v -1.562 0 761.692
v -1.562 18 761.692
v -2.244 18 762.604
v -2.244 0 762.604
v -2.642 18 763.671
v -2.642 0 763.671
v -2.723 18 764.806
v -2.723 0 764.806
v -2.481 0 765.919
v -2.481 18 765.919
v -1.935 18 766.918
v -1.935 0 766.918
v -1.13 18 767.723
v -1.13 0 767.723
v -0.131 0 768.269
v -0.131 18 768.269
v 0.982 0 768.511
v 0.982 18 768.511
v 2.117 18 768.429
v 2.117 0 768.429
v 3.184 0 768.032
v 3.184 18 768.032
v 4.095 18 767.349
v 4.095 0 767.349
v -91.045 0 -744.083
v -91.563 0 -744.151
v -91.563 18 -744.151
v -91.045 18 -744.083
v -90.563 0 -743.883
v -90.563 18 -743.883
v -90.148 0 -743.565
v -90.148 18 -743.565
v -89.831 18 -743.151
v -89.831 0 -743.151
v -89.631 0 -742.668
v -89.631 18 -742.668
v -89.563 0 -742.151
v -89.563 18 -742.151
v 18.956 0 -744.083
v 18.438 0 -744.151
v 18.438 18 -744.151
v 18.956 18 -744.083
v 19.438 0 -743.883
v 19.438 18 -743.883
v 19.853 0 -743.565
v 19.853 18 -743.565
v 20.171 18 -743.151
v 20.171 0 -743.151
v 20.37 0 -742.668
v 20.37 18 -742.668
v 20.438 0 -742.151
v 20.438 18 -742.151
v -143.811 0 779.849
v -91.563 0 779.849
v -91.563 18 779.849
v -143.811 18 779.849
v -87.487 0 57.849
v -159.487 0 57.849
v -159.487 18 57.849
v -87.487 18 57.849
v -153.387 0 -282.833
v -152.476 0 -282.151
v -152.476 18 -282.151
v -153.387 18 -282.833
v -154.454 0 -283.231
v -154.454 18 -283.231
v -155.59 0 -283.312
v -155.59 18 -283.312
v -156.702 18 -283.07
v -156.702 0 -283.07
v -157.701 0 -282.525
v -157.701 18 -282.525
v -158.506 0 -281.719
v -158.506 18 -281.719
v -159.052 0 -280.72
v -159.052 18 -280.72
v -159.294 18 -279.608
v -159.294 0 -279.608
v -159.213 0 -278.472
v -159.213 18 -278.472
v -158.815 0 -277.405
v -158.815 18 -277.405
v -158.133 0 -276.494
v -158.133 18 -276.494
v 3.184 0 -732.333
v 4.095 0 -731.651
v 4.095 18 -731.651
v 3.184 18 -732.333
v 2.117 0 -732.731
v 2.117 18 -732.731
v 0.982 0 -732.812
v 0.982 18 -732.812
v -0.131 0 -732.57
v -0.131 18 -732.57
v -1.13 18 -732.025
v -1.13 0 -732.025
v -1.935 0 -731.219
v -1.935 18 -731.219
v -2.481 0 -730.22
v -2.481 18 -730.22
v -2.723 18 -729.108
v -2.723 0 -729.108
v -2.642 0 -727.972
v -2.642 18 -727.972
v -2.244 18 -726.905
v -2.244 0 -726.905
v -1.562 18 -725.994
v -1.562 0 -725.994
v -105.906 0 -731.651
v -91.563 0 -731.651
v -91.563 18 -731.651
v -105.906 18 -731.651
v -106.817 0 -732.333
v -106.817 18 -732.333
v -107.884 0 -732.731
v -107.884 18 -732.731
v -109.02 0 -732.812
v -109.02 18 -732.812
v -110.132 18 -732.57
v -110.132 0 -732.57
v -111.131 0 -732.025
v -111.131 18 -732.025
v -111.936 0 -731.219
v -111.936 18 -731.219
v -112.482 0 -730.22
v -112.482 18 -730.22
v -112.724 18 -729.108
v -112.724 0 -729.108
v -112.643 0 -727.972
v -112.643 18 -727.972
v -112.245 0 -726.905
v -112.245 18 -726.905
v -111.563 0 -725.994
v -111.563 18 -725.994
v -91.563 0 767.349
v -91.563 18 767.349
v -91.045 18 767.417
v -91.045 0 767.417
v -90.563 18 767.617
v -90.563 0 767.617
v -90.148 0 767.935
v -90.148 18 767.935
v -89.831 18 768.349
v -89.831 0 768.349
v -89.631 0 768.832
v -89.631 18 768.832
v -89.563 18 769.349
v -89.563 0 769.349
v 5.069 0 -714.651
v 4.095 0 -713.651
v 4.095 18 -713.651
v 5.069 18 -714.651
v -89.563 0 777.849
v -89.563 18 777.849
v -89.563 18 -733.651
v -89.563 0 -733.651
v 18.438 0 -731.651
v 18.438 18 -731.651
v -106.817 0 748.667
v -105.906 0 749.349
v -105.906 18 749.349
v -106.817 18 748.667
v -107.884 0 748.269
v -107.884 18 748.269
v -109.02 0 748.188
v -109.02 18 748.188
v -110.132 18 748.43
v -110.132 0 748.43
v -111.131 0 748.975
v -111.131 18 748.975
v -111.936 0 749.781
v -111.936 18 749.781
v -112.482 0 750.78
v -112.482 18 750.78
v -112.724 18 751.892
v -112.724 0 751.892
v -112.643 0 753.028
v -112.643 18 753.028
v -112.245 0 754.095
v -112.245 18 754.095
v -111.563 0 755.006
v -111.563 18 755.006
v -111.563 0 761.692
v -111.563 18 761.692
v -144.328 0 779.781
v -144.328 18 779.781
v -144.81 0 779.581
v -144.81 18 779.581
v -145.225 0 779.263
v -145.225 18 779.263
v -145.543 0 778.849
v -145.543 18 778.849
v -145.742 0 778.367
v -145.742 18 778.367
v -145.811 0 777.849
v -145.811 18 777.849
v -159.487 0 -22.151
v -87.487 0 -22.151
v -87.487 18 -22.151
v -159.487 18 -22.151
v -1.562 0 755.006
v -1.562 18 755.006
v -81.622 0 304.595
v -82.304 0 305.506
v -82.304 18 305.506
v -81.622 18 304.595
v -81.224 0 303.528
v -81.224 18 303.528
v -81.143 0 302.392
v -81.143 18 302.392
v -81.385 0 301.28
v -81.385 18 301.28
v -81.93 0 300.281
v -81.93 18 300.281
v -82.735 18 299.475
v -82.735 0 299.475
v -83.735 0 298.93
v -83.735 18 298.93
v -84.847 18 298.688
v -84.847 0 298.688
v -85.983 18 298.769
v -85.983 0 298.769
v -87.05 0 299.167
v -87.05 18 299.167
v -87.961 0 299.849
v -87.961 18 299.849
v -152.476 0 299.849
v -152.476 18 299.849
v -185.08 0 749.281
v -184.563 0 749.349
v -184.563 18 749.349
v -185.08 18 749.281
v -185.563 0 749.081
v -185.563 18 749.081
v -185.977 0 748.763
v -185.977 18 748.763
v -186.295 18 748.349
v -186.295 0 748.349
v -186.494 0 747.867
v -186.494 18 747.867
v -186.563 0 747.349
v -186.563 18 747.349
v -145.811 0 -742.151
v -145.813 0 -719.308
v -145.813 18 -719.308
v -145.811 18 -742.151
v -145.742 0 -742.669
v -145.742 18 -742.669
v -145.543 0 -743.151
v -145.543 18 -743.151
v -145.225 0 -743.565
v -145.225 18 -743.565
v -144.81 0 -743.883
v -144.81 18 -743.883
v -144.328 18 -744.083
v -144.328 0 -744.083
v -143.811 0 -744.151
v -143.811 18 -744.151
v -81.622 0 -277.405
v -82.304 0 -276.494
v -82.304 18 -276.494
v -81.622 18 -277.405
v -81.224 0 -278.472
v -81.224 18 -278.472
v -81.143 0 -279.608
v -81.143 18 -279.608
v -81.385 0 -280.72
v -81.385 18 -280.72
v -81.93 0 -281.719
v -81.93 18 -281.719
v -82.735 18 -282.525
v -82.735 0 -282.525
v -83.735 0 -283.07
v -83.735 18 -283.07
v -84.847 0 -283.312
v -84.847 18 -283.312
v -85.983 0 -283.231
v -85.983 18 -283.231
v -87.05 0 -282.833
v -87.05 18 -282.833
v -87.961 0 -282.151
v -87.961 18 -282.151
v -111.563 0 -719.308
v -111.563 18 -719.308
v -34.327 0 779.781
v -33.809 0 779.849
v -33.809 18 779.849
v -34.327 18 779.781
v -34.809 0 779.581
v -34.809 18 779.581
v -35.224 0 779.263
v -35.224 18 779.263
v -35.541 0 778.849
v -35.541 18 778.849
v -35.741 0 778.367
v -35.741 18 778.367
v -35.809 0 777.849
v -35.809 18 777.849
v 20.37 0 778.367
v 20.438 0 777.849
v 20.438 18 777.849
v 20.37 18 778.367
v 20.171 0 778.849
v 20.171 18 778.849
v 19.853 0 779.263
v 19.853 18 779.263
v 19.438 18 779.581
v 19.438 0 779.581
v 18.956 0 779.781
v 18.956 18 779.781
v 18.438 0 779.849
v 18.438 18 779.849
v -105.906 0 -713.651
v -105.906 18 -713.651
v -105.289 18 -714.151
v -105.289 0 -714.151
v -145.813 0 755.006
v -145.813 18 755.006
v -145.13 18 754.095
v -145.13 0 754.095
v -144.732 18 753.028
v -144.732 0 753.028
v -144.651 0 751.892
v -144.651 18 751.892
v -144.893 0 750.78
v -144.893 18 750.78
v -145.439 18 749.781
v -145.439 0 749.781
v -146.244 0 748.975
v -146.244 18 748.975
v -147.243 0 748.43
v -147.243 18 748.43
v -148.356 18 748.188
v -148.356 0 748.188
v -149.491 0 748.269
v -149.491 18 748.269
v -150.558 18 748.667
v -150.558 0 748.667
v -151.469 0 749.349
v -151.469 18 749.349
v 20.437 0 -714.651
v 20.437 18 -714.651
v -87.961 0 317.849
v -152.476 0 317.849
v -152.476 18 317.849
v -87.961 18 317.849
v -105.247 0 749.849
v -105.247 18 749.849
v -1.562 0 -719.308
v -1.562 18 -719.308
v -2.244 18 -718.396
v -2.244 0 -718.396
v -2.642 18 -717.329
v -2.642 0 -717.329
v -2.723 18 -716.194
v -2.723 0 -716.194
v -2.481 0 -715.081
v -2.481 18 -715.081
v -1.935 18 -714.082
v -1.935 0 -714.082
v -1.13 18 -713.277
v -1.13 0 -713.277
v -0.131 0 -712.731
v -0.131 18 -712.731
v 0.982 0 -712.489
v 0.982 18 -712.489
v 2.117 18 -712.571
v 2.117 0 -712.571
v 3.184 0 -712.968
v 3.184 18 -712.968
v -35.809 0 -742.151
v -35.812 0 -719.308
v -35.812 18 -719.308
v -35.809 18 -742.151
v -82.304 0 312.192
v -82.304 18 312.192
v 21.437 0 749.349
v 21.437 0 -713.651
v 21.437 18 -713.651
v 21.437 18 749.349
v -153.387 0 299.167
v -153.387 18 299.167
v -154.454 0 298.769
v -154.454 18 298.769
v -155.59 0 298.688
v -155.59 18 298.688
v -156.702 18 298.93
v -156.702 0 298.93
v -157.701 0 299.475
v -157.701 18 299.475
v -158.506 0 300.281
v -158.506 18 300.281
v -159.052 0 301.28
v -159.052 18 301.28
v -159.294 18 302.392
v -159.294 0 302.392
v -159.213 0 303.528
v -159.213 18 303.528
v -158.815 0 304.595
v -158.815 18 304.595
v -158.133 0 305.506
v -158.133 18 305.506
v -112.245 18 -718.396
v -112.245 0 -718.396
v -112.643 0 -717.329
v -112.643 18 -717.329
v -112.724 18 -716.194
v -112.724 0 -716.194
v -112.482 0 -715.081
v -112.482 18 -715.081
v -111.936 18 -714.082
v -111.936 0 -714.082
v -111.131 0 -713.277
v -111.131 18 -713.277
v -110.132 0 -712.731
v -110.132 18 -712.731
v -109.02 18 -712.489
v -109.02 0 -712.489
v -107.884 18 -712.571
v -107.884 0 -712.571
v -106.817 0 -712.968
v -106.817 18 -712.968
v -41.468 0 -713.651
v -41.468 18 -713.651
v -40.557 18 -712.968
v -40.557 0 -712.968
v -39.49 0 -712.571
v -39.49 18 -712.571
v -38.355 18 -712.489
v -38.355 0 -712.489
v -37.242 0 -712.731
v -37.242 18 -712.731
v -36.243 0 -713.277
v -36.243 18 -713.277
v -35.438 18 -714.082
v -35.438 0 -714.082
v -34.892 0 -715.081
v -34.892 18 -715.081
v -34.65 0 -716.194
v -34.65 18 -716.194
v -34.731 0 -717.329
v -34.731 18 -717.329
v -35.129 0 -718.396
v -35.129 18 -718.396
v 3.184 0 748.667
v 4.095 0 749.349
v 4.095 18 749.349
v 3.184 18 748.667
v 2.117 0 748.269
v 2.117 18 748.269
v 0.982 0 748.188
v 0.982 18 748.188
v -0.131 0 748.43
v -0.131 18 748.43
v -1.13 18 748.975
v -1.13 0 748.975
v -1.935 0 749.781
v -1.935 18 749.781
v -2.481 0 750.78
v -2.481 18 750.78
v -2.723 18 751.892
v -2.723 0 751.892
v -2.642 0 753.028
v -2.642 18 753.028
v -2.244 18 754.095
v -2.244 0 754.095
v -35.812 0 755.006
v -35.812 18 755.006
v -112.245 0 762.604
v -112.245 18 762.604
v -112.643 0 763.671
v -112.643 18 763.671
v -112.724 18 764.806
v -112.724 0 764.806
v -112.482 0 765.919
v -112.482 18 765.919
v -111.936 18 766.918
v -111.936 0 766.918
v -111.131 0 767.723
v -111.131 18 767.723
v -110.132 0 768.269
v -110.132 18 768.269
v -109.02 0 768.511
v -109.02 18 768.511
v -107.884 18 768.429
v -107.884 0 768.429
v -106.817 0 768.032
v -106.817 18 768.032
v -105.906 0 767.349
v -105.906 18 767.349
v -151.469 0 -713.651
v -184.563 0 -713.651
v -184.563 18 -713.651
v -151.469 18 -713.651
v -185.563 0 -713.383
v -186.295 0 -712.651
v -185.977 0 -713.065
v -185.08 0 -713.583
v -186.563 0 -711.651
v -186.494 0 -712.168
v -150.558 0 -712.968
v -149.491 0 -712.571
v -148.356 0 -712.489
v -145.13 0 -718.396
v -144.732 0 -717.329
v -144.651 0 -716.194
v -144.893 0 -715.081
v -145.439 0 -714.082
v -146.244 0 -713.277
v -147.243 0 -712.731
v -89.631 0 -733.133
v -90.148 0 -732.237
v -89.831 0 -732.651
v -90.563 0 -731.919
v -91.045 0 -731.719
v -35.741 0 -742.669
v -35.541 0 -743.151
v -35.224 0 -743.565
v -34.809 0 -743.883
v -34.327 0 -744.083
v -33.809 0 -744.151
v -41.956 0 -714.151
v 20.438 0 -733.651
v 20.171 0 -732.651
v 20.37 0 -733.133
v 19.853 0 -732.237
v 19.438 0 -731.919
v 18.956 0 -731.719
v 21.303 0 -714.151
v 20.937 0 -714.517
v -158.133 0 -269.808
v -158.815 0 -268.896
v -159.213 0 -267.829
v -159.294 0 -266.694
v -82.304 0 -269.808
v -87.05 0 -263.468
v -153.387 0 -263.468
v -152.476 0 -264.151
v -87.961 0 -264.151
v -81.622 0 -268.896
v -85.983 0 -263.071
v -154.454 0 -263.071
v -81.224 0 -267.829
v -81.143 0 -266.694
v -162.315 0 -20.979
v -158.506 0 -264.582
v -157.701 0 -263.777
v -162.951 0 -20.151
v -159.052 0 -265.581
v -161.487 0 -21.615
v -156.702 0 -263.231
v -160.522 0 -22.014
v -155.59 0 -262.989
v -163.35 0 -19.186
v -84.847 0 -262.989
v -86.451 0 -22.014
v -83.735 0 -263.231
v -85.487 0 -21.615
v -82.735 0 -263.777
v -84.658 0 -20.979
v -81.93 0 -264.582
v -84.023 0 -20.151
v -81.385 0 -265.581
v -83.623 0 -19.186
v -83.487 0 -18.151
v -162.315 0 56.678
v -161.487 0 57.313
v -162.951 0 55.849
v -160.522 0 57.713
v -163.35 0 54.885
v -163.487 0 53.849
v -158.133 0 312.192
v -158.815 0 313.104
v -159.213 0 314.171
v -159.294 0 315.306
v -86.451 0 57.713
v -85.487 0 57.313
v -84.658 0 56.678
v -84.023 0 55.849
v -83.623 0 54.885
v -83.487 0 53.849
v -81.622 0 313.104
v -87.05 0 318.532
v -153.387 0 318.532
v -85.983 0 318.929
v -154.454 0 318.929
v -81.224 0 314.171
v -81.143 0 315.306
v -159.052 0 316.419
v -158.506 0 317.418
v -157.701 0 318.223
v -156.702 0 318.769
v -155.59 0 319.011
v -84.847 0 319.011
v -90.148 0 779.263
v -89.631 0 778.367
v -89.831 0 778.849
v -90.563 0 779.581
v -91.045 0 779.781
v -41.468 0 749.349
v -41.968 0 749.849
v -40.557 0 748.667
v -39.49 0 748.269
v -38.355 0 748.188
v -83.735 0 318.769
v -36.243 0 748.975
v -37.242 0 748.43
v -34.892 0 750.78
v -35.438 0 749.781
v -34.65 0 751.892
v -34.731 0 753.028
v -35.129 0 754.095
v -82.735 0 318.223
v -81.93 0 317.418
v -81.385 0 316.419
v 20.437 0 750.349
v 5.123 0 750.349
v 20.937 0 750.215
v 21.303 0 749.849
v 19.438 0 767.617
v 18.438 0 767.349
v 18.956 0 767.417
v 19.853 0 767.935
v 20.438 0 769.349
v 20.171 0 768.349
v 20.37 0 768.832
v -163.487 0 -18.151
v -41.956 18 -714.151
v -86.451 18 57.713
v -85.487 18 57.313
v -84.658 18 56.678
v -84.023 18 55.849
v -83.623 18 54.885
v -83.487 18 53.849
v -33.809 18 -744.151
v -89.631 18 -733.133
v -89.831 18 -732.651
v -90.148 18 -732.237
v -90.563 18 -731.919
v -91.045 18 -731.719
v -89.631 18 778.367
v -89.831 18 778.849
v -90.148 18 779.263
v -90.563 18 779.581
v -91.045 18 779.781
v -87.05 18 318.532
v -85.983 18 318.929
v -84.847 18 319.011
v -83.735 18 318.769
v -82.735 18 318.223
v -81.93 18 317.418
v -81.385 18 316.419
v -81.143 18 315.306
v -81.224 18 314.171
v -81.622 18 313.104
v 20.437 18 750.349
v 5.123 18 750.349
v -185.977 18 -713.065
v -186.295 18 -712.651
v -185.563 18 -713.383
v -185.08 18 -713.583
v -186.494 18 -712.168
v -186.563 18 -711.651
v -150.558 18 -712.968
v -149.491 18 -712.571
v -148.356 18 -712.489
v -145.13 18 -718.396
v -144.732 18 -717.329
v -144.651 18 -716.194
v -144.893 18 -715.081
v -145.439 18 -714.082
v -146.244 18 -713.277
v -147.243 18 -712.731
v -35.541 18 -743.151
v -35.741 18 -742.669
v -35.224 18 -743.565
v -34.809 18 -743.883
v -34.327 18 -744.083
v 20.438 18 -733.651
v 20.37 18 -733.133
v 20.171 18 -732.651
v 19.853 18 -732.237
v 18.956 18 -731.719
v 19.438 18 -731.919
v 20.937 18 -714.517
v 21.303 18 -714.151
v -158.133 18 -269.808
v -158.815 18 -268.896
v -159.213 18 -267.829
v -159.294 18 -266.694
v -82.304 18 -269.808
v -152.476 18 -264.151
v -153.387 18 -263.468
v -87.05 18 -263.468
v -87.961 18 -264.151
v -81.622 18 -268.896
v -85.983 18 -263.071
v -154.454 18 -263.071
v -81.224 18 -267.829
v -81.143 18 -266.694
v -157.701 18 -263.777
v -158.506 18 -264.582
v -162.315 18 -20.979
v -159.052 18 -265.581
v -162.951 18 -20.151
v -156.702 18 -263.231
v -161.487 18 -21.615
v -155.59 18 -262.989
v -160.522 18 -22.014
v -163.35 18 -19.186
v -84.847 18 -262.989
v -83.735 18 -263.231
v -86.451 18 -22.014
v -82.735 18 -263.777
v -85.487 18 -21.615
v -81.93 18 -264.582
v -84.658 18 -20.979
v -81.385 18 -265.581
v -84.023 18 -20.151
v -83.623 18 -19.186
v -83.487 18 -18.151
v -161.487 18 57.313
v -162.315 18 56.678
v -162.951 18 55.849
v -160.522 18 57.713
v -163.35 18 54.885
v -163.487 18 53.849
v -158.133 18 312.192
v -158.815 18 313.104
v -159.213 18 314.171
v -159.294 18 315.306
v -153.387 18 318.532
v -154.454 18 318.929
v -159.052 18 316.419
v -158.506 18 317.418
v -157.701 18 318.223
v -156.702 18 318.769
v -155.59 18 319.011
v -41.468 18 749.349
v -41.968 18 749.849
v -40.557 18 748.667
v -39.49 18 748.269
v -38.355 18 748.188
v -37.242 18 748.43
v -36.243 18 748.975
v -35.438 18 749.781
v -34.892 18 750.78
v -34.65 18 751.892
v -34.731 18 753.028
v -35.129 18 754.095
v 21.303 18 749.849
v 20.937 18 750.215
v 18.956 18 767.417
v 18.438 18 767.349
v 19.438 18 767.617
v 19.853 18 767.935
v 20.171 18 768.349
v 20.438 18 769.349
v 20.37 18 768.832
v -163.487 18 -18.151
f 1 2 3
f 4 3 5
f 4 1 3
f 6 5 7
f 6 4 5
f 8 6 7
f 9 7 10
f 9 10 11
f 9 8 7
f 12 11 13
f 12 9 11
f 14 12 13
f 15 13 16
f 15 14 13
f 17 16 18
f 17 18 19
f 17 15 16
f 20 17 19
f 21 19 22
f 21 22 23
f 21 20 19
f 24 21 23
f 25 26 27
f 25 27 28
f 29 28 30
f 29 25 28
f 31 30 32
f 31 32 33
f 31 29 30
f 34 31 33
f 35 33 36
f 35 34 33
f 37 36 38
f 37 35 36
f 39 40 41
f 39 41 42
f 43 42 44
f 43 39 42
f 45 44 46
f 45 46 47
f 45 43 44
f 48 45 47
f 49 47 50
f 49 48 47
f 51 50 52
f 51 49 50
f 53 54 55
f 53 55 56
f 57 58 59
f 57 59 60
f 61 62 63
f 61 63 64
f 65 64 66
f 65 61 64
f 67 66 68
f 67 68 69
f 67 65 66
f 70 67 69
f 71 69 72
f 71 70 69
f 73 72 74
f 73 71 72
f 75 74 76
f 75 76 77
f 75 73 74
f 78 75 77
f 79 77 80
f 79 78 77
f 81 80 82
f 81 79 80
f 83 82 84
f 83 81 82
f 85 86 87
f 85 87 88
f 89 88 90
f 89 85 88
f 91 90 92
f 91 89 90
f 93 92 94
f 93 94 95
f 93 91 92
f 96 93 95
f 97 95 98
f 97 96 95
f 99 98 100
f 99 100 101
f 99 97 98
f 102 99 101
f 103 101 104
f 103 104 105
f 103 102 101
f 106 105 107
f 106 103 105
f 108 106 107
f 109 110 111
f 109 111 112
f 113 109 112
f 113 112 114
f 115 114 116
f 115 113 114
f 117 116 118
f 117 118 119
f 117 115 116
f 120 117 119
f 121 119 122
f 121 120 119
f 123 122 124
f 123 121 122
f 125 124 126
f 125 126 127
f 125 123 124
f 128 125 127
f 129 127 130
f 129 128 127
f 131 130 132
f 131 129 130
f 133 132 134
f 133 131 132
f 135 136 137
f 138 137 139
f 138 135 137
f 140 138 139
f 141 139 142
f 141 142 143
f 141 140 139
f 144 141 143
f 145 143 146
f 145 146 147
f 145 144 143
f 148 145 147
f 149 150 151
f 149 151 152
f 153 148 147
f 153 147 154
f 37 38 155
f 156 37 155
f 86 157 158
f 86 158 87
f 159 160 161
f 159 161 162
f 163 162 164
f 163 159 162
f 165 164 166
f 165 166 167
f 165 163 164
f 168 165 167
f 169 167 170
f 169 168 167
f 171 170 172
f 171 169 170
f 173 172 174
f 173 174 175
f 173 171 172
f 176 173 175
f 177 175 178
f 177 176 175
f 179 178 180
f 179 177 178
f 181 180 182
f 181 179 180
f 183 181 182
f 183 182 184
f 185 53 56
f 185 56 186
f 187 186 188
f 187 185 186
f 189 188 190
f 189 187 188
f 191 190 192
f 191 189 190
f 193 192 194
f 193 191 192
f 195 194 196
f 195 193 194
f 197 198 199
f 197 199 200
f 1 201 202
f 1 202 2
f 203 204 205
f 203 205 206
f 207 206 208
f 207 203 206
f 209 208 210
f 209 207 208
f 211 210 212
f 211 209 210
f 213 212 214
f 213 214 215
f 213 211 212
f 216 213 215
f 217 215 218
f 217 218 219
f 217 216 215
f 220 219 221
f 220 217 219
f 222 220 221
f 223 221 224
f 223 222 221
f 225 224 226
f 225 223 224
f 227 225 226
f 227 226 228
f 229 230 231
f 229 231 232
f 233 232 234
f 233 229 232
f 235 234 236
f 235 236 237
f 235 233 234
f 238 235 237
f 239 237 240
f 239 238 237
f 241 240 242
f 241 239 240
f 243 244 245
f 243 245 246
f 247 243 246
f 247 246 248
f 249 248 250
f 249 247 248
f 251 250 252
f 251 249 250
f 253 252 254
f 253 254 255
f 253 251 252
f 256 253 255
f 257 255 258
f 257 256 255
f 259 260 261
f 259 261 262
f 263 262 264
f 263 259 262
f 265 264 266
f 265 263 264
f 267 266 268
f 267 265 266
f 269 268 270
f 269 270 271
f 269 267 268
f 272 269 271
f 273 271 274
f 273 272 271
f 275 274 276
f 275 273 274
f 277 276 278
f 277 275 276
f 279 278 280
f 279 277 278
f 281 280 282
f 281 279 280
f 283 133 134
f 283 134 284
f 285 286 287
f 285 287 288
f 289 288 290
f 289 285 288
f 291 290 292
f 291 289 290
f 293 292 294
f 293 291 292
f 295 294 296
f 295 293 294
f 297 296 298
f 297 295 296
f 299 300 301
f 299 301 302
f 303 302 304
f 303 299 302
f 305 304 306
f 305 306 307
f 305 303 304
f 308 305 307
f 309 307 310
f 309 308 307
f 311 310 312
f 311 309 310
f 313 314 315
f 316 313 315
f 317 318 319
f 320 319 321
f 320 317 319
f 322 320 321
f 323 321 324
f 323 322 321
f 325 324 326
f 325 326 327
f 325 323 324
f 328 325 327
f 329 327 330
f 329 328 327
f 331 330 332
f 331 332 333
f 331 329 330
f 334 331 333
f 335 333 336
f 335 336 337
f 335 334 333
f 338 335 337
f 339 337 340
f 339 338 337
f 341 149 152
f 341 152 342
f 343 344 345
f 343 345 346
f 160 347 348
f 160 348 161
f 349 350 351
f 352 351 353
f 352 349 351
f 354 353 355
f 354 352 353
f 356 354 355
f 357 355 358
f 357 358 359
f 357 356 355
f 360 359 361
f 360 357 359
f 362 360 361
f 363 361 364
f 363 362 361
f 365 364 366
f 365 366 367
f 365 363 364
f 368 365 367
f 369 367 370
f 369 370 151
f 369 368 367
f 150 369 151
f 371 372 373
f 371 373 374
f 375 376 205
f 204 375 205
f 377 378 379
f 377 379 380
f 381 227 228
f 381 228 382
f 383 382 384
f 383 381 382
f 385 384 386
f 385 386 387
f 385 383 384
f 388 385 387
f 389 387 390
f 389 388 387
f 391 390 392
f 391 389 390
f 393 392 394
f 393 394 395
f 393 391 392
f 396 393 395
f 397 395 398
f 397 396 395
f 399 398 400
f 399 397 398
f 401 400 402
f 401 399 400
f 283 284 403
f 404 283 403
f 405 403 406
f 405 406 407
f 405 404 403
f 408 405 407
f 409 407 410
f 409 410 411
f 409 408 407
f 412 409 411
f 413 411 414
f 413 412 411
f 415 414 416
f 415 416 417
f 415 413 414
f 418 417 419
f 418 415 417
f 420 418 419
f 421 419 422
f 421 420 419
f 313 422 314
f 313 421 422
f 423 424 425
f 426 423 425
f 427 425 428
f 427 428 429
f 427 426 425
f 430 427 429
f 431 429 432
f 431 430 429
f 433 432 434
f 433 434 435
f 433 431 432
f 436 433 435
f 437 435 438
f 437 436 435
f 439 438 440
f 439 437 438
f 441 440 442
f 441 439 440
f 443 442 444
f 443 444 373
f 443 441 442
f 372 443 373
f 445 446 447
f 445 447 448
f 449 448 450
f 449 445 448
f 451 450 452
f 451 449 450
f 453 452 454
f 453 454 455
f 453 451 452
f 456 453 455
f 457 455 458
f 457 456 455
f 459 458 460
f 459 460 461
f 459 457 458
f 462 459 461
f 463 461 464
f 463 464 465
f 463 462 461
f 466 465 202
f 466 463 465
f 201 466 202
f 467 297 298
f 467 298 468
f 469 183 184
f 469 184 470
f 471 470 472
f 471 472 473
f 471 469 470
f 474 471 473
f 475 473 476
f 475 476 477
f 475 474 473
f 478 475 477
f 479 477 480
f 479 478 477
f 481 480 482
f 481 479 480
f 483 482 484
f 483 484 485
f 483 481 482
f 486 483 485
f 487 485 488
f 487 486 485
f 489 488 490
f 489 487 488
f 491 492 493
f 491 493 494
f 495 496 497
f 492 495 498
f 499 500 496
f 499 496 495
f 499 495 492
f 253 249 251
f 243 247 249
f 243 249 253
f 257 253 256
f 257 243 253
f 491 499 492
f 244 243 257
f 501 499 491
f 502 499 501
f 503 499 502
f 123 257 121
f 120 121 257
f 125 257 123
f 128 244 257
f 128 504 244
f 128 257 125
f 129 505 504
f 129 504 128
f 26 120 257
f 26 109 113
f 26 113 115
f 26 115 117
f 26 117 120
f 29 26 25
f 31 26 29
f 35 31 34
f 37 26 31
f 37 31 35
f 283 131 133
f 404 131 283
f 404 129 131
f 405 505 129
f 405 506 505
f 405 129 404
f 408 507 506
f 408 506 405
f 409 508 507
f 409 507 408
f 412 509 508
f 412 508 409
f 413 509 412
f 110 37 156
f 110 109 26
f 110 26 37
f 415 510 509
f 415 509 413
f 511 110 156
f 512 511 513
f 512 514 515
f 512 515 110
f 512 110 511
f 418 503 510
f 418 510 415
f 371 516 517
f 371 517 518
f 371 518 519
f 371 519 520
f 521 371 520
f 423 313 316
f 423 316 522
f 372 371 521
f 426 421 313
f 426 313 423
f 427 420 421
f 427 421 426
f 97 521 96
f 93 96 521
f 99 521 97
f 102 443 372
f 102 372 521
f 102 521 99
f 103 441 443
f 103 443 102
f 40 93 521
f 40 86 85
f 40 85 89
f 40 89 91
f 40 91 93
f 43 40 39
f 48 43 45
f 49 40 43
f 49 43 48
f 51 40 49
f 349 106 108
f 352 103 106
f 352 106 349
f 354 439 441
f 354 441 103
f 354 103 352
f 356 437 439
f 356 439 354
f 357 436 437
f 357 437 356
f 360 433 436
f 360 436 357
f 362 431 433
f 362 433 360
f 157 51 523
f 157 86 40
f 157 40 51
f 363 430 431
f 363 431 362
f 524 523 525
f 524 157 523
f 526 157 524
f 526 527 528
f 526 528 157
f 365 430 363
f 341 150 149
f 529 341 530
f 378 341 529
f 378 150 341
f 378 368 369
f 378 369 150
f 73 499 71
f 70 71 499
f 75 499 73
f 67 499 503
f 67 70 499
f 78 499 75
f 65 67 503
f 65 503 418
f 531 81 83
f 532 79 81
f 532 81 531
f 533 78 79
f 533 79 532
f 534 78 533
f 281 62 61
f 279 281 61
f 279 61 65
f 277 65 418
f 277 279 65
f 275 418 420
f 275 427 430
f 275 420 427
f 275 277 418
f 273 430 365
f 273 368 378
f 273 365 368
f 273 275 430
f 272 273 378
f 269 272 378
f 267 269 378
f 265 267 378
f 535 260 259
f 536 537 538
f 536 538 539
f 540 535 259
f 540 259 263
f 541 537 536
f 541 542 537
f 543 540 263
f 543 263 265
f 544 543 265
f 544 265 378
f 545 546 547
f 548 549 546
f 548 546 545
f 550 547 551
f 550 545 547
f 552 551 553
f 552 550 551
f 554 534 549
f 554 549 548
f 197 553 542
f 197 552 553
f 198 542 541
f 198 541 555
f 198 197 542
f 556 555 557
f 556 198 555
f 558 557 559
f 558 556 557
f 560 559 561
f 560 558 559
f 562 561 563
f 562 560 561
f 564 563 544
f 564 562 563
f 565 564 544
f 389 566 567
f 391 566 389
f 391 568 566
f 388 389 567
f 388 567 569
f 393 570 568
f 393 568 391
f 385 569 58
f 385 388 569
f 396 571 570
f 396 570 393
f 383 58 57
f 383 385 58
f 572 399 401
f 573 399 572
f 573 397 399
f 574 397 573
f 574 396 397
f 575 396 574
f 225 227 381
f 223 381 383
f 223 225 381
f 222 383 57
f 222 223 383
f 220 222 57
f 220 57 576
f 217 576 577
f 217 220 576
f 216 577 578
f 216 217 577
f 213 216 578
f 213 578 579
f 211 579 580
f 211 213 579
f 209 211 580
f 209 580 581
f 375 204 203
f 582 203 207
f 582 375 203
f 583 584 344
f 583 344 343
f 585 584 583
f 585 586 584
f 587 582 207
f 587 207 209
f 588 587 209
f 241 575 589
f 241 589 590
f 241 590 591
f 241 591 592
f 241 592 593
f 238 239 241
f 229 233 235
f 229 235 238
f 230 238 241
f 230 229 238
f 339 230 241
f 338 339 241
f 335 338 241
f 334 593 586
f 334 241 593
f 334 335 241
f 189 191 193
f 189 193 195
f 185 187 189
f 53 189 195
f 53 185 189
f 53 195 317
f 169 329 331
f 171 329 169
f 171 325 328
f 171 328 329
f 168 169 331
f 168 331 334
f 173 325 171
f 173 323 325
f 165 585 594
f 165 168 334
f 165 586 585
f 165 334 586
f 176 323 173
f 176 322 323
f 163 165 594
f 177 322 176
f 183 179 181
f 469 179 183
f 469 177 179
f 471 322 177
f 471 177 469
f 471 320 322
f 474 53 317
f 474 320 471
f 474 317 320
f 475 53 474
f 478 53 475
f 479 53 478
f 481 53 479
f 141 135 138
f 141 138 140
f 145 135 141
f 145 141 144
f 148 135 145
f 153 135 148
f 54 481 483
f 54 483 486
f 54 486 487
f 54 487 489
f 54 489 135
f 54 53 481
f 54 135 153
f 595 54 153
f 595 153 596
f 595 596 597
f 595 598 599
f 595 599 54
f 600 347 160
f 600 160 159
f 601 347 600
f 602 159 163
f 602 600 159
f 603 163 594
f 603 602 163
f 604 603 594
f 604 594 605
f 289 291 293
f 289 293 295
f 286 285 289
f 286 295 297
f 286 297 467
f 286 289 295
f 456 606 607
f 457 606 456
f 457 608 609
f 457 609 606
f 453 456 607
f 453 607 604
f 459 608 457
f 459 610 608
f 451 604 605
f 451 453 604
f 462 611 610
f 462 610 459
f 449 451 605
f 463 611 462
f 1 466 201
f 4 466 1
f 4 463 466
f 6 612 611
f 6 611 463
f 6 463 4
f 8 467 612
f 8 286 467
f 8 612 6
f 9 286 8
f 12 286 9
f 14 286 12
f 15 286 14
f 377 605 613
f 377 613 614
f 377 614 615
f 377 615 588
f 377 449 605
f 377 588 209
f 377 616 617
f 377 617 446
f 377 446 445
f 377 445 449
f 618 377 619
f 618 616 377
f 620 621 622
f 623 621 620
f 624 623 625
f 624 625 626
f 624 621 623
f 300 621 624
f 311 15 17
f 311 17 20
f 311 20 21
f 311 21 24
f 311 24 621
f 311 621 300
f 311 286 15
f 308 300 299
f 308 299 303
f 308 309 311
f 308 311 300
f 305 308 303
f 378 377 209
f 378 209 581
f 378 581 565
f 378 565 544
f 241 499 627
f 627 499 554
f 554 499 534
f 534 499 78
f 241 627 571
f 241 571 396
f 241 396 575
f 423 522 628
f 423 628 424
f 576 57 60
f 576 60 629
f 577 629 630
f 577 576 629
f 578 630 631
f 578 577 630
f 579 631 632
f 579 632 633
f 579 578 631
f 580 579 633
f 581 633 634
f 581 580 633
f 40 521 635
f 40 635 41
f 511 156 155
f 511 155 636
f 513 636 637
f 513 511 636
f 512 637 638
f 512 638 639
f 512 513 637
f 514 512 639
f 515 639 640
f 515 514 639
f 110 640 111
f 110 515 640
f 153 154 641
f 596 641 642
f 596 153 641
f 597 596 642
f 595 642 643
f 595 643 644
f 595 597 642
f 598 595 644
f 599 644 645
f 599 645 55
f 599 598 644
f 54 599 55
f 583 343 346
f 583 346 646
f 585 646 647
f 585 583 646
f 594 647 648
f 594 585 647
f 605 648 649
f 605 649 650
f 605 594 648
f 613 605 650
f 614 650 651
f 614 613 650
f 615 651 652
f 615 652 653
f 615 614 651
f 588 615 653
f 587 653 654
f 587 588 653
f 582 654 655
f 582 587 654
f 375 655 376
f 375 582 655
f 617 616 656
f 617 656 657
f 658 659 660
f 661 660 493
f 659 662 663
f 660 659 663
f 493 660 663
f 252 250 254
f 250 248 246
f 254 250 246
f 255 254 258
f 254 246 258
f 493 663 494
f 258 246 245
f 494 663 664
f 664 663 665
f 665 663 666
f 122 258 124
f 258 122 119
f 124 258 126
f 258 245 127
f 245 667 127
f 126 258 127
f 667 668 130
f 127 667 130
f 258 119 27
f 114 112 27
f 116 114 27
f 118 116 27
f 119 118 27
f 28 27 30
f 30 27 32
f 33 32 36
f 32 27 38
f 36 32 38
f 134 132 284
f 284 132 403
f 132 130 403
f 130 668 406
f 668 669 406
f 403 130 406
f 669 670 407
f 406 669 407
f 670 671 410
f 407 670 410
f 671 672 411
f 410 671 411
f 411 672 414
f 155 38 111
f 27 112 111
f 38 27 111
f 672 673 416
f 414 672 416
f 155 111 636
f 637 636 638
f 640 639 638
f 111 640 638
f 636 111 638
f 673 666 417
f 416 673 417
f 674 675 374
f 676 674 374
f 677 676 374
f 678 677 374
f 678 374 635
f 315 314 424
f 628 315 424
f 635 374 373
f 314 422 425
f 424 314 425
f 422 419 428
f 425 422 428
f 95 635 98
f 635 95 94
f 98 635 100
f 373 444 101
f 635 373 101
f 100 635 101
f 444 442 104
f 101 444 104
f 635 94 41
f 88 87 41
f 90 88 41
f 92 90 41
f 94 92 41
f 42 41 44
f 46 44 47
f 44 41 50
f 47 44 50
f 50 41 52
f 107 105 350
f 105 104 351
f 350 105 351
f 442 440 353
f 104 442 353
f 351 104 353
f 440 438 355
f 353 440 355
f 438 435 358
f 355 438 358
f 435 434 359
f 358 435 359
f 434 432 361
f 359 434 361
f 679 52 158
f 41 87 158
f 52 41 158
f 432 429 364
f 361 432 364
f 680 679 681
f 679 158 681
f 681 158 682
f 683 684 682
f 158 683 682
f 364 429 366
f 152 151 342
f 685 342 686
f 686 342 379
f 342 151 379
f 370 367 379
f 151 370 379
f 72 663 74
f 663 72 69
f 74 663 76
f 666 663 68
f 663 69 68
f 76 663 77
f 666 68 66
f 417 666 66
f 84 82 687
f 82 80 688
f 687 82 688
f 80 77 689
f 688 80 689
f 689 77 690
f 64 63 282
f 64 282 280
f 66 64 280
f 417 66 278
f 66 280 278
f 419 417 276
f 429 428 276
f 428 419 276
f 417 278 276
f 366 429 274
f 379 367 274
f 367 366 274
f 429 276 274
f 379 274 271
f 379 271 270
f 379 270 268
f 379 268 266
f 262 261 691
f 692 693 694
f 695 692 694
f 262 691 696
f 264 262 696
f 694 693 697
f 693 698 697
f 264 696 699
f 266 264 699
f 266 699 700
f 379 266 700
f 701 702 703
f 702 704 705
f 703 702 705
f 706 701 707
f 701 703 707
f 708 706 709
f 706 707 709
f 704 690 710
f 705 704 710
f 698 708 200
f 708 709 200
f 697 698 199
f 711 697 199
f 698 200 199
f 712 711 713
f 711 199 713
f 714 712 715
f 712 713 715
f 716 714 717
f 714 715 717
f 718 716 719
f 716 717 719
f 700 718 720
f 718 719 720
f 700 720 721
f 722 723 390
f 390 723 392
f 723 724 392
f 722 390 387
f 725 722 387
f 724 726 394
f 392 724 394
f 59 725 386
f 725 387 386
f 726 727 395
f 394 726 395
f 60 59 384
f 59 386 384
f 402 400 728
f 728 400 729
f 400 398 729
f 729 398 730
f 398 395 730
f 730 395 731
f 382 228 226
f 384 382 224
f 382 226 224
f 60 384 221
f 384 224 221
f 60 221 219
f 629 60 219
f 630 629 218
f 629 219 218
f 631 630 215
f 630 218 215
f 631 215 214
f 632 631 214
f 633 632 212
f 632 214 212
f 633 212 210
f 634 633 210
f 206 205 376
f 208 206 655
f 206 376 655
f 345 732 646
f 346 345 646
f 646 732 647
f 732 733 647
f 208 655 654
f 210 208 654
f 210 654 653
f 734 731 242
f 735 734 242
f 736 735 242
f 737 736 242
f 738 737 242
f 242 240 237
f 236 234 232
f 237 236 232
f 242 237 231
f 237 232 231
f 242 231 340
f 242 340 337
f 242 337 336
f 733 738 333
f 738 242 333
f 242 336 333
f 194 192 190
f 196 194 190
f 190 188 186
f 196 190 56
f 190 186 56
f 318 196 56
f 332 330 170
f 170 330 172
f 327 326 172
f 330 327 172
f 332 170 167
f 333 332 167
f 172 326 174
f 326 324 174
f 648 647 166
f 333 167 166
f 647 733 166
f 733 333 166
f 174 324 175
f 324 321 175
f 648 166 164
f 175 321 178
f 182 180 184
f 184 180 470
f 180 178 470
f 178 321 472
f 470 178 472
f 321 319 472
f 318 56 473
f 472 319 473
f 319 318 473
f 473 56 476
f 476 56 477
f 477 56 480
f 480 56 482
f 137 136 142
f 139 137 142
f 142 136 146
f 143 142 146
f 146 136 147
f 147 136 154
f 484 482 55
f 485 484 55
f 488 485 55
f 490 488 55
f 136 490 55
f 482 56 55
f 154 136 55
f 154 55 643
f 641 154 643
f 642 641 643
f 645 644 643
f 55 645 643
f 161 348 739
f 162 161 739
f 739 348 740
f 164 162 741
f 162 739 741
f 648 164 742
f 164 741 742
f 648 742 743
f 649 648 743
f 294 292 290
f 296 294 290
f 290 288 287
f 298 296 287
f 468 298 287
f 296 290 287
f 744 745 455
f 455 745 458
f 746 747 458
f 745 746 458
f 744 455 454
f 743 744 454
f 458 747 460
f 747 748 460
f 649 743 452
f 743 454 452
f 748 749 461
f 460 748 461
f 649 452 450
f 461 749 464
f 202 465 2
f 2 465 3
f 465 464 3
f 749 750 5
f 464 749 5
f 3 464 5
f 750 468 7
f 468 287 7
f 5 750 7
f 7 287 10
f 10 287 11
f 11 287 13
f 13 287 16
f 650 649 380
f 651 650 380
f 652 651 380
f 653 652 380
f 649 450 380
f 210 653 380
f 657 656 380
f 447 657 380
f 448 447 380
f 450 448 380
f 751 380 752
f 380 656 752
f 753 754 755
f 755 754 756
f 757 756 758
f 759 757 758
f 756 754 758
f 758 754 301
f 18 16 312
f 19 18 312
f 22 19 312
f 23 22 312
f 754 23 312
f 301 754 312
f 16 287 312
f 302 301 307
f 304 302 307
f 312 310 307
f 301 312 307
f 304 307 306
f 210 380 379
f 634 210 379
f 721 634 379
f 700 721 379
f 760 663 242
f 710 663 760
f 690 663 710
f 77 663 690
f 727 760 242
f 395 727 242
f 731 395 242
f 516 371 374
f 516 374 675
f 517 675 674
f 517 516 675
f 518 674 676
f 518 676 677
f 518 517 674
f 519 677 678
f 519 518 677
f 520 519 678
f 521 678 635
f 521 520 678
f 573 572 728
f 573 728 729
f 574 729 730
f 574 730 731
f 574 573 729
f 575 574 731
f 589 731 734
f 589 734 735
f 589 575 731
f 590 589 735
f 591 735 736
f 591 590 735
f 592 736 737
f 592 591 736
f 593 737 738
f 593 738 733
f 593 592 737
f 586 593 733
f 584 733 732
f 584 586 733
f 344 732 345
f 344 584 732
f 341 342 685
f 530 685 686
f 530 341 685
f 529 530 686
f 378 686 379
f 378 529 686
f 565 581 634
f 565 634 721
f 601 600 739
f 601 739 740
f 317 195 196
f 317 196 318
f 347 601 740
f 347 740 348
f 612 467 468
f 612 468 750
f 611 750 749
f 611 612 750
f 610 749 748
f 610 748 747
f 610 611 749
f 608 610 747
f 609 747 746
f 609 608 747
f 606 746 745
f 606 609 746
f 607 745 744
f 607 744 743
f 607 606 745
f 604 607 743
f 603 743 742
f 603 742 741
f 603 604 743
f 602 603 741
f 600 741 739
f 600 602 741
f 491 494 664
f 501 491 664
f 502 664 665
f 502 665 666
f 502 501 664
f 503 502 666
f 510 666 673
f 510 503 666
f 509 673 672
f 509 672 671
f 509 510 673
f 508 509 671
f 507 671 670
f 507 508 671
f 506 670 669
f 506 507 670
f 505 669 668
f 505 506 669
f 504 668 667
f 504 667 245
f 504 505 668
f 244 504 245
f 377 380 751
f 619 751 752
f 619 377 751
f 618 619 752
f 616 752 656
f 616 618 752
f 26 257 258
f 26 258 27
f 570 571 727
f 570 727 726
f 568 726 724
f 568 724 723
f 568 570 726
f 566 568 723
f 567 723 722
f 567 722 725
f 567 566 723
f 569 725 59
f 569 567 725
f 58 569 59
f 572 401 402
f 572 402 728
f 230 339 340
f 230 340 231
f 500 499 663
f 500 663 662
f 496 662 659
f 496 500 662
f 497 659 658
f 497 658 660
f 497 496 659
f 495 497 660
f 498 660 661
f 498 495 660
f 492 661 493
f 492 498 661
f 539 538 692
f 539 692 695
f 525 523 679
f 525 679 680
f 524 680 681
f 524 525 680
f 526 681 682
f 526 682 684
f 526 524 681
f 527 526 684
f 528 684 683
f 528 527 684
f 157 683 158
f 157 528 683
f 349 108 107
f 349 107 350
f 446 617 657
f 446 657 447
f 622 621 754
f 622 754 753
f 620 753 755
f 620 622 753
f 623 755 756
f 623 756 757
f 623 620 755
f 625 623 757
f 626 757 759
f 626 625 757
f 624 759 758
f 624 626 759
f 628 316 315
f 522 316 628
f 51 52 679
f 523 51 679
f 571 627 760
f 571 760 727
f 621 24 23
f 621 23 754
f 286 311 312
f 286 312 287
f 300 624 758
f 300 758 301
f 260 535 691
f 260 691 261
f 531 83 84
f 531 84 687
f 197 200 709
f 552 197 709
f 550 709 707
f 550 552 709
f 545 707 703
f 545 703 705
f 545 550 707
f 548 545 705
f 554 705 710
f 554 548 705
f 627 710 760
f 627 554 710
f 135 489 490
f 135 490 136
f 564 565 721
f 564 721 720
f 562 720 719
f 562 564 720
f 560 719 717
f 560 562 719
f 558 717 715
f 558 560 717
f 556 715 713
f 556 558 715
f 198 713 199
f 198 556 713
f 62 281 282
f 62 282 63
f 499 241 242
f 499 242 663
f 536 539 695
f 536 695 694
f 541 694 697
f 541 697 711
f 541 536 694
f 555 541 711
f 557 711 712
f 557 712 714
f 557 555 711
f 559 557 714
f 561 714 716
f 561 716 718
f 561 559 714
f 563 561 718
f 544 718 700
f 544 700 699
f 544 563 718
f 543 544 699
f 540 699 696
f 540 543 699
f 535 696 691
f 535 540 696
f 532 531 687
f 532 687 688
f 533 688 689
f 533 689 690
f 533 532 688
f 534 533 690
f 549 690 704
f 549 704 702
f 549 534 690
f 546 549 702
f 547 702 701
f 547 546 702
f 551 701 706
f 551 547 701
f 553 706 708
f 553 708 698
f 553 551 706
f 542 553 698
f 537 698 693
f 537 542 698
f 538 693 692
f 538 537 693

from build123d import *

# Parameters (mm, degrees)
F1_DEPTH = 18


# Not quite as in the source:
# - ends of sketch curves that miss each other by under 0.0002 mm in the source are joined


with BuildPart() as f1:
    # F0 (on Front) → F1 (new body)
    with BuildSketch(Plane.XZ):
        with BuildLine():
            ThreePointArc((-111.5625776076, -719.3076212806), (-111.5625776076, -713.6507670312), (-105.9057233581, -713.6507670312))
            Line((-105.9057233581, -713.6507670312), (-105.2886944829, -714.1507671559))
            Line((-105.2886944829, -714.1507671559), (-41.9563794829, -714.1507671559))
            Line((-41.9563794829, -714.1507671559), (-41.4683634829, -713.6507671559))
            ThreePointArc((-41.4683634829, -713.6507671559), (-35.8115093581, -713.6507670312), (-35.8115093581, -719.3076212806))
            Line((-35.8115093581, -719.3076212806), (-35.8094664829, -742.1509261559))
            ThreePointArc((-35.8094664829, -742.1509261559), (-35.2236167578, -743.5650240029), (-33.8094664829, -744.1507471559))
            Line((-33.8094664829, -744.1507471559), (18.4384905171, -744.1507471559))
            ThreePointArc((18.4384905171, -744.1507471559), (19.8527040795, -743.5649607183), (20.4384905171, -742.1507471559))
            Line((20.4384905171, -742.1507471559), (20.4384905171, -733.6507671559))
            ThreePointArc((20.4384905171, -733.6507671559), (19.8527040795, -732.2365535935), (18.4384905171, -731.6507671559))
            Line((18.4384905171, -731.6507671559), (4.0953445171, -731.6507671559))
            ThreePointArc((4.0953445171, -731.6507671559), (-1.5615098576, -731.6507670306), (-1.5615091076, -725.9939125312))
            Line((-1.5615091076, -725.9939125312), (-1.5615094829, -719.3076211559))
            ThreePointArc((-1.5615094829, -719.3076211559), (-1.5615096076, -713.6507670312), (4.0953446419, -713.6507670312))
            Line((4.0953446419, -713.6507670312), (5.0690155171, -714.6507671559))
            Line((5.0690155171, -714.6507671559), (20.4374225171, -714.6507671559))
            ThreePointArc((20.4374225171, -714.6507671559), (21.1445292983, -714.3578739371), (21.4374225171, -713.6507671559))
            Line((21.4374225171, -713.6507671559), (21.4374225171, 749.3492328441))
            ThreePointArc((21.4374225171, 749.3492328441), (21.1445292983, 750.0563396253), (20.4374225171, 750.3492328441))
            Line((20.4374225171, 750.3492328441), (5.1226495171, 750.3492328441))
            Line((5.1226495171, 750.3492328441), (4.0953445171, 749.3492328441))
            ThreePointArc((4.0953445171, 749.3492328441), (-1.5615098576, 749.3492329694), (-1.5615091076, 755.0060874688))
            Line((-1.5615091076, 755.0060874688), (-1.5615094829, 761.6923788441))
            ThreePointArc((-1.5615094829, 761.6923788441), (-1.5615096076, 767.3492329688), (4.0953446419, 767.3492329688))
            Line((4.0953446419, 767.3492329688), (18.4384905171, 767.3492328441))
            ThreePointArc((18.4384905171, 767.3492328441), (19.8527040795, 767.9350192817), (20.4384905171, 769.3492328441))
            Line((20.4384905171, 769.3492328441), (20.4384905171, 777.8492138441))
            ThreePointArc((20.4384905171, 777.8492138441), (19.8527040795, 779.2634274065), (18.4384905171, 779.8492138441))
            Line((18.4384905171, 779.8492138441), (-33.8094664829, 779.8492138441))
            ThreePointArc((-33.8094664829, 779.8492138441), (-35.2236171114, 779.2634903376), (-35.809466475, 777.8493918441))
            Line((-35.809466475, 777.8493918441), (-35.8115094829, 755.0060878441))
            ThreePointArc((-35.8115094829, 755.0060878441), (-35.8115091081, 749.3492329694), (-41.4683636076, 749.3492327194))
            Line((-41.4683636076, 749.3492327194), (-41.9683634829, 749.8492328441))
            Line((-41.9683634829, 749.8492328441), (-105.2468454829, 749.8492328441))
            Line((-105.2468454829, 749.8492328441), (-105.9057234829, 749.3492328441))
            ThreePointArc((-105.9057234829, 749.3492328441), (-111.5625778576, 749.3492329694), (-111.5625771076, 755.0060874688))
            Line((-111.5625771076, 755.0060874688), (-111.5625774829, 761.6923788441))
            ThreePointArc((-111.5625774829, 761.6923788441), (-111.5625776076, 767.3492329688), (-105.9057233581, 767.3492329688))
            Line((-105.9057233581, 767.3492329688), (-91.5625774829, 767.3492328441))
            ThreePointArc((-91.5625774829, 767.3492328441), (-90.1483639205, 767.9350192817), (-89.5625774829, 769.3492328441))
            Line((-89.5625774829, 769.3492328441), (-89.5625774829, 777.8492138441))
            ThreePointArc((-89.5625774829, 777.8492138441), (-90.1483639205, 779.2634274065), (-91.5625774829, 779.8492138441))
            Line((-91.5625774829, 779.8492138441), (-143.8105344829, 779.8492138441))
            ThreePointArc((-143.8105344829, 779.8492138441), (-145.2246851114, 779.2634903376), (-145.810534475, 777.8493918441))
            Line((-145.810534475, 777.8493918441), (-145.8125774829, 755.0060878441))
            ThreePointArc((-145.8125774829, 755.0060878441), (-145.8125771081, 749.3492329694), (-151.4694316076, 749.3492327194))
            Line((-151.4694316076, 749.3492327194), (-184.5625764829, 749.3492328441))
            ThreePointArc((-184.5625764829, 749.3492328441), (-185.9767900453, 748.7634464065), (-186.5625764829, 747.3492328441))
            Line((-186.5625764829, 747.3492328441), (-186.5625764829, -711.6507671559))
            ThreePointArc((-186.5625764829, -711.6507671559), (-185.9767900453, -713.0649807183), (-184.5625764829, -713.6507671559))
            Line((-184.5625764829, -713.6507671559), (-151.4694314829, -713.6507671559))
            ThreePointArc((-151.4694314829, -713.6507671559), (-145.8125773581, -713.6507670312), (-145.8125773581, -719.3076212806))
            Line((-145.8125773581, -719.3076212806), (-145.8105344829, -742.1509261559))
            ThreePointArc((-145.8105344829, -742.1509261559), (-145.2246847578, -743.5650240029), (-143.8105344829, -744.1507471559))
            Line((-143.8105344829, -744.1507471559), (-91.5625774829, -744.1507471559))
            ThreePointArc((-91.5625774829, -744.1507471559), (-90.1483639205, -743.5649607183), (-89.5625774829, -742.1507471559))
            Line((-89.5625774829, -742.1507471559), (-89.5625774829, -733.6507671559))
            ThreePointArc((-89.5625774829, -733.6507671559), (-90.1483639205, -732.2365535935), (-91.5625774829, -731.6507671559))
            Line((-91.5625774829, -731.6507671559), (-105.9057234829, -731.6507671559))
            ThreePointArc((-105.9057234829, -731.6507671559), (-111.5625778576, -731.6507670306), (-111.5625771076, -725.9939125312))
            Line((-111.5625771076, -725.9939125312), (-111.5625776076, -719.3076212806))
        make_face()
        with BuildLine():
            ThreePointArc((-82.3041508581, -276.4939125312), (-82.3041501081, -282.1507670306), (-87.9610046076, -282.1507672806))
            Line((-87.9610046076, -282.1507672806), (-152.4757234829, -282.1507671559))
            ThreePointArc((-152.4757234829, -282.1507671559), (-158.1325778576, -282.1507670306), (-158.1325771076, -276.4939125312))
            Line((-158.1325771076, -276.4939125312), (-158.1325774829, -269.8076211559))
            ThreePointArc((-158.1325774829, -269.8076211559), (-158.1325776076, -264.1507670312), (-152.4757233581, -264.1507670312))
            Line((-152.4757233581, -264.1507670312), (-87.9610044829, -264.1507671559))
            ThreePointArc((-87.9610044829, -264.1507671559), (-82.3041503581, -264.1507670312), (-82.3041503581, -269.8076212806))
            Line((-82.3041503581, -269.8076212806), (-82.3041508581, -276.4939125312))
        make_face(mode=Mode.SUBTRACT)
        with BuildLine():
            Line((-163.4866634829, -18.1507671559), (-163.4866634829, 53.8492328441))
            ThreePointArc((-163.4866634829, 53.8492328441), (-162.3150906076, 56.6776599688), (-159.4866634829, 57.8492328441))
            Line((-159.4866634829, 57.8492328441), (-87.4866634829, 57.8492328441))
            ThreePointArc((-87.4866634829, 57.8492328441), (-84.6582363581, 56.6776599688), (-83.4866634829, 53.8492328441))
            Line((-83.4866634829, 53.8492328441), (-83.4866634829, -18.1507671559))
            ThreePointArc((-83.4866634829, -18.1507671559), (-84.6582363581, -20.9791942806), (-87.4866634829, -22.1507671559))
            Line((-87.4866634829, -22.1507671559), (-159.4866634829, -22.1507671559))
            ThreePointArc((-159.4866634829, -22.1507671559), (-162.3150906076, -20.9791942806), (-163.4866634829, -18.1507671559))
        make_face(mode=Mode.SUBTRACT)
        with BuildLine():
            Line((-82.3041504829, 312.1923788441), (-82.3041504829, 305.5060878441))
            ThreePointArc((-82.3041504829, 305.5060878441), (-82.3041503581, 299.8492327194), (-87.9610046076, 299.8492327194))
            Line((-87.9610046076, 299.8492327194), (-152.4757234829, 299.8492328441))
            ThreePointArc((-152.4757234829, 299.8492328441), (-158.1325778576, 299.8492329694), (-158.1325771076, 305.5060874688))
            Line((-158.1325771076, 305.5060874688), (-158.1325774829, 312.1923788441))
            ThreePointArc((-158.1325774829, 312.1923788441), (-158.1325776076, 317.8492329688), (-152.4757233581, 317.8492329688))
            Line((-152.4757233581, 317.8492329688), (-87.9610044829, 317.8492328441))
            ThreePointArc((-87.9610044829, 317.8492328441), (-82.3041503581, 317.8492329688), (-82.3041504829, 312.1923788441))
        make_face(mode=Mode.SUBTRACT)
    extrude(amount=-F1_DEPTH)


solid = f1.part
